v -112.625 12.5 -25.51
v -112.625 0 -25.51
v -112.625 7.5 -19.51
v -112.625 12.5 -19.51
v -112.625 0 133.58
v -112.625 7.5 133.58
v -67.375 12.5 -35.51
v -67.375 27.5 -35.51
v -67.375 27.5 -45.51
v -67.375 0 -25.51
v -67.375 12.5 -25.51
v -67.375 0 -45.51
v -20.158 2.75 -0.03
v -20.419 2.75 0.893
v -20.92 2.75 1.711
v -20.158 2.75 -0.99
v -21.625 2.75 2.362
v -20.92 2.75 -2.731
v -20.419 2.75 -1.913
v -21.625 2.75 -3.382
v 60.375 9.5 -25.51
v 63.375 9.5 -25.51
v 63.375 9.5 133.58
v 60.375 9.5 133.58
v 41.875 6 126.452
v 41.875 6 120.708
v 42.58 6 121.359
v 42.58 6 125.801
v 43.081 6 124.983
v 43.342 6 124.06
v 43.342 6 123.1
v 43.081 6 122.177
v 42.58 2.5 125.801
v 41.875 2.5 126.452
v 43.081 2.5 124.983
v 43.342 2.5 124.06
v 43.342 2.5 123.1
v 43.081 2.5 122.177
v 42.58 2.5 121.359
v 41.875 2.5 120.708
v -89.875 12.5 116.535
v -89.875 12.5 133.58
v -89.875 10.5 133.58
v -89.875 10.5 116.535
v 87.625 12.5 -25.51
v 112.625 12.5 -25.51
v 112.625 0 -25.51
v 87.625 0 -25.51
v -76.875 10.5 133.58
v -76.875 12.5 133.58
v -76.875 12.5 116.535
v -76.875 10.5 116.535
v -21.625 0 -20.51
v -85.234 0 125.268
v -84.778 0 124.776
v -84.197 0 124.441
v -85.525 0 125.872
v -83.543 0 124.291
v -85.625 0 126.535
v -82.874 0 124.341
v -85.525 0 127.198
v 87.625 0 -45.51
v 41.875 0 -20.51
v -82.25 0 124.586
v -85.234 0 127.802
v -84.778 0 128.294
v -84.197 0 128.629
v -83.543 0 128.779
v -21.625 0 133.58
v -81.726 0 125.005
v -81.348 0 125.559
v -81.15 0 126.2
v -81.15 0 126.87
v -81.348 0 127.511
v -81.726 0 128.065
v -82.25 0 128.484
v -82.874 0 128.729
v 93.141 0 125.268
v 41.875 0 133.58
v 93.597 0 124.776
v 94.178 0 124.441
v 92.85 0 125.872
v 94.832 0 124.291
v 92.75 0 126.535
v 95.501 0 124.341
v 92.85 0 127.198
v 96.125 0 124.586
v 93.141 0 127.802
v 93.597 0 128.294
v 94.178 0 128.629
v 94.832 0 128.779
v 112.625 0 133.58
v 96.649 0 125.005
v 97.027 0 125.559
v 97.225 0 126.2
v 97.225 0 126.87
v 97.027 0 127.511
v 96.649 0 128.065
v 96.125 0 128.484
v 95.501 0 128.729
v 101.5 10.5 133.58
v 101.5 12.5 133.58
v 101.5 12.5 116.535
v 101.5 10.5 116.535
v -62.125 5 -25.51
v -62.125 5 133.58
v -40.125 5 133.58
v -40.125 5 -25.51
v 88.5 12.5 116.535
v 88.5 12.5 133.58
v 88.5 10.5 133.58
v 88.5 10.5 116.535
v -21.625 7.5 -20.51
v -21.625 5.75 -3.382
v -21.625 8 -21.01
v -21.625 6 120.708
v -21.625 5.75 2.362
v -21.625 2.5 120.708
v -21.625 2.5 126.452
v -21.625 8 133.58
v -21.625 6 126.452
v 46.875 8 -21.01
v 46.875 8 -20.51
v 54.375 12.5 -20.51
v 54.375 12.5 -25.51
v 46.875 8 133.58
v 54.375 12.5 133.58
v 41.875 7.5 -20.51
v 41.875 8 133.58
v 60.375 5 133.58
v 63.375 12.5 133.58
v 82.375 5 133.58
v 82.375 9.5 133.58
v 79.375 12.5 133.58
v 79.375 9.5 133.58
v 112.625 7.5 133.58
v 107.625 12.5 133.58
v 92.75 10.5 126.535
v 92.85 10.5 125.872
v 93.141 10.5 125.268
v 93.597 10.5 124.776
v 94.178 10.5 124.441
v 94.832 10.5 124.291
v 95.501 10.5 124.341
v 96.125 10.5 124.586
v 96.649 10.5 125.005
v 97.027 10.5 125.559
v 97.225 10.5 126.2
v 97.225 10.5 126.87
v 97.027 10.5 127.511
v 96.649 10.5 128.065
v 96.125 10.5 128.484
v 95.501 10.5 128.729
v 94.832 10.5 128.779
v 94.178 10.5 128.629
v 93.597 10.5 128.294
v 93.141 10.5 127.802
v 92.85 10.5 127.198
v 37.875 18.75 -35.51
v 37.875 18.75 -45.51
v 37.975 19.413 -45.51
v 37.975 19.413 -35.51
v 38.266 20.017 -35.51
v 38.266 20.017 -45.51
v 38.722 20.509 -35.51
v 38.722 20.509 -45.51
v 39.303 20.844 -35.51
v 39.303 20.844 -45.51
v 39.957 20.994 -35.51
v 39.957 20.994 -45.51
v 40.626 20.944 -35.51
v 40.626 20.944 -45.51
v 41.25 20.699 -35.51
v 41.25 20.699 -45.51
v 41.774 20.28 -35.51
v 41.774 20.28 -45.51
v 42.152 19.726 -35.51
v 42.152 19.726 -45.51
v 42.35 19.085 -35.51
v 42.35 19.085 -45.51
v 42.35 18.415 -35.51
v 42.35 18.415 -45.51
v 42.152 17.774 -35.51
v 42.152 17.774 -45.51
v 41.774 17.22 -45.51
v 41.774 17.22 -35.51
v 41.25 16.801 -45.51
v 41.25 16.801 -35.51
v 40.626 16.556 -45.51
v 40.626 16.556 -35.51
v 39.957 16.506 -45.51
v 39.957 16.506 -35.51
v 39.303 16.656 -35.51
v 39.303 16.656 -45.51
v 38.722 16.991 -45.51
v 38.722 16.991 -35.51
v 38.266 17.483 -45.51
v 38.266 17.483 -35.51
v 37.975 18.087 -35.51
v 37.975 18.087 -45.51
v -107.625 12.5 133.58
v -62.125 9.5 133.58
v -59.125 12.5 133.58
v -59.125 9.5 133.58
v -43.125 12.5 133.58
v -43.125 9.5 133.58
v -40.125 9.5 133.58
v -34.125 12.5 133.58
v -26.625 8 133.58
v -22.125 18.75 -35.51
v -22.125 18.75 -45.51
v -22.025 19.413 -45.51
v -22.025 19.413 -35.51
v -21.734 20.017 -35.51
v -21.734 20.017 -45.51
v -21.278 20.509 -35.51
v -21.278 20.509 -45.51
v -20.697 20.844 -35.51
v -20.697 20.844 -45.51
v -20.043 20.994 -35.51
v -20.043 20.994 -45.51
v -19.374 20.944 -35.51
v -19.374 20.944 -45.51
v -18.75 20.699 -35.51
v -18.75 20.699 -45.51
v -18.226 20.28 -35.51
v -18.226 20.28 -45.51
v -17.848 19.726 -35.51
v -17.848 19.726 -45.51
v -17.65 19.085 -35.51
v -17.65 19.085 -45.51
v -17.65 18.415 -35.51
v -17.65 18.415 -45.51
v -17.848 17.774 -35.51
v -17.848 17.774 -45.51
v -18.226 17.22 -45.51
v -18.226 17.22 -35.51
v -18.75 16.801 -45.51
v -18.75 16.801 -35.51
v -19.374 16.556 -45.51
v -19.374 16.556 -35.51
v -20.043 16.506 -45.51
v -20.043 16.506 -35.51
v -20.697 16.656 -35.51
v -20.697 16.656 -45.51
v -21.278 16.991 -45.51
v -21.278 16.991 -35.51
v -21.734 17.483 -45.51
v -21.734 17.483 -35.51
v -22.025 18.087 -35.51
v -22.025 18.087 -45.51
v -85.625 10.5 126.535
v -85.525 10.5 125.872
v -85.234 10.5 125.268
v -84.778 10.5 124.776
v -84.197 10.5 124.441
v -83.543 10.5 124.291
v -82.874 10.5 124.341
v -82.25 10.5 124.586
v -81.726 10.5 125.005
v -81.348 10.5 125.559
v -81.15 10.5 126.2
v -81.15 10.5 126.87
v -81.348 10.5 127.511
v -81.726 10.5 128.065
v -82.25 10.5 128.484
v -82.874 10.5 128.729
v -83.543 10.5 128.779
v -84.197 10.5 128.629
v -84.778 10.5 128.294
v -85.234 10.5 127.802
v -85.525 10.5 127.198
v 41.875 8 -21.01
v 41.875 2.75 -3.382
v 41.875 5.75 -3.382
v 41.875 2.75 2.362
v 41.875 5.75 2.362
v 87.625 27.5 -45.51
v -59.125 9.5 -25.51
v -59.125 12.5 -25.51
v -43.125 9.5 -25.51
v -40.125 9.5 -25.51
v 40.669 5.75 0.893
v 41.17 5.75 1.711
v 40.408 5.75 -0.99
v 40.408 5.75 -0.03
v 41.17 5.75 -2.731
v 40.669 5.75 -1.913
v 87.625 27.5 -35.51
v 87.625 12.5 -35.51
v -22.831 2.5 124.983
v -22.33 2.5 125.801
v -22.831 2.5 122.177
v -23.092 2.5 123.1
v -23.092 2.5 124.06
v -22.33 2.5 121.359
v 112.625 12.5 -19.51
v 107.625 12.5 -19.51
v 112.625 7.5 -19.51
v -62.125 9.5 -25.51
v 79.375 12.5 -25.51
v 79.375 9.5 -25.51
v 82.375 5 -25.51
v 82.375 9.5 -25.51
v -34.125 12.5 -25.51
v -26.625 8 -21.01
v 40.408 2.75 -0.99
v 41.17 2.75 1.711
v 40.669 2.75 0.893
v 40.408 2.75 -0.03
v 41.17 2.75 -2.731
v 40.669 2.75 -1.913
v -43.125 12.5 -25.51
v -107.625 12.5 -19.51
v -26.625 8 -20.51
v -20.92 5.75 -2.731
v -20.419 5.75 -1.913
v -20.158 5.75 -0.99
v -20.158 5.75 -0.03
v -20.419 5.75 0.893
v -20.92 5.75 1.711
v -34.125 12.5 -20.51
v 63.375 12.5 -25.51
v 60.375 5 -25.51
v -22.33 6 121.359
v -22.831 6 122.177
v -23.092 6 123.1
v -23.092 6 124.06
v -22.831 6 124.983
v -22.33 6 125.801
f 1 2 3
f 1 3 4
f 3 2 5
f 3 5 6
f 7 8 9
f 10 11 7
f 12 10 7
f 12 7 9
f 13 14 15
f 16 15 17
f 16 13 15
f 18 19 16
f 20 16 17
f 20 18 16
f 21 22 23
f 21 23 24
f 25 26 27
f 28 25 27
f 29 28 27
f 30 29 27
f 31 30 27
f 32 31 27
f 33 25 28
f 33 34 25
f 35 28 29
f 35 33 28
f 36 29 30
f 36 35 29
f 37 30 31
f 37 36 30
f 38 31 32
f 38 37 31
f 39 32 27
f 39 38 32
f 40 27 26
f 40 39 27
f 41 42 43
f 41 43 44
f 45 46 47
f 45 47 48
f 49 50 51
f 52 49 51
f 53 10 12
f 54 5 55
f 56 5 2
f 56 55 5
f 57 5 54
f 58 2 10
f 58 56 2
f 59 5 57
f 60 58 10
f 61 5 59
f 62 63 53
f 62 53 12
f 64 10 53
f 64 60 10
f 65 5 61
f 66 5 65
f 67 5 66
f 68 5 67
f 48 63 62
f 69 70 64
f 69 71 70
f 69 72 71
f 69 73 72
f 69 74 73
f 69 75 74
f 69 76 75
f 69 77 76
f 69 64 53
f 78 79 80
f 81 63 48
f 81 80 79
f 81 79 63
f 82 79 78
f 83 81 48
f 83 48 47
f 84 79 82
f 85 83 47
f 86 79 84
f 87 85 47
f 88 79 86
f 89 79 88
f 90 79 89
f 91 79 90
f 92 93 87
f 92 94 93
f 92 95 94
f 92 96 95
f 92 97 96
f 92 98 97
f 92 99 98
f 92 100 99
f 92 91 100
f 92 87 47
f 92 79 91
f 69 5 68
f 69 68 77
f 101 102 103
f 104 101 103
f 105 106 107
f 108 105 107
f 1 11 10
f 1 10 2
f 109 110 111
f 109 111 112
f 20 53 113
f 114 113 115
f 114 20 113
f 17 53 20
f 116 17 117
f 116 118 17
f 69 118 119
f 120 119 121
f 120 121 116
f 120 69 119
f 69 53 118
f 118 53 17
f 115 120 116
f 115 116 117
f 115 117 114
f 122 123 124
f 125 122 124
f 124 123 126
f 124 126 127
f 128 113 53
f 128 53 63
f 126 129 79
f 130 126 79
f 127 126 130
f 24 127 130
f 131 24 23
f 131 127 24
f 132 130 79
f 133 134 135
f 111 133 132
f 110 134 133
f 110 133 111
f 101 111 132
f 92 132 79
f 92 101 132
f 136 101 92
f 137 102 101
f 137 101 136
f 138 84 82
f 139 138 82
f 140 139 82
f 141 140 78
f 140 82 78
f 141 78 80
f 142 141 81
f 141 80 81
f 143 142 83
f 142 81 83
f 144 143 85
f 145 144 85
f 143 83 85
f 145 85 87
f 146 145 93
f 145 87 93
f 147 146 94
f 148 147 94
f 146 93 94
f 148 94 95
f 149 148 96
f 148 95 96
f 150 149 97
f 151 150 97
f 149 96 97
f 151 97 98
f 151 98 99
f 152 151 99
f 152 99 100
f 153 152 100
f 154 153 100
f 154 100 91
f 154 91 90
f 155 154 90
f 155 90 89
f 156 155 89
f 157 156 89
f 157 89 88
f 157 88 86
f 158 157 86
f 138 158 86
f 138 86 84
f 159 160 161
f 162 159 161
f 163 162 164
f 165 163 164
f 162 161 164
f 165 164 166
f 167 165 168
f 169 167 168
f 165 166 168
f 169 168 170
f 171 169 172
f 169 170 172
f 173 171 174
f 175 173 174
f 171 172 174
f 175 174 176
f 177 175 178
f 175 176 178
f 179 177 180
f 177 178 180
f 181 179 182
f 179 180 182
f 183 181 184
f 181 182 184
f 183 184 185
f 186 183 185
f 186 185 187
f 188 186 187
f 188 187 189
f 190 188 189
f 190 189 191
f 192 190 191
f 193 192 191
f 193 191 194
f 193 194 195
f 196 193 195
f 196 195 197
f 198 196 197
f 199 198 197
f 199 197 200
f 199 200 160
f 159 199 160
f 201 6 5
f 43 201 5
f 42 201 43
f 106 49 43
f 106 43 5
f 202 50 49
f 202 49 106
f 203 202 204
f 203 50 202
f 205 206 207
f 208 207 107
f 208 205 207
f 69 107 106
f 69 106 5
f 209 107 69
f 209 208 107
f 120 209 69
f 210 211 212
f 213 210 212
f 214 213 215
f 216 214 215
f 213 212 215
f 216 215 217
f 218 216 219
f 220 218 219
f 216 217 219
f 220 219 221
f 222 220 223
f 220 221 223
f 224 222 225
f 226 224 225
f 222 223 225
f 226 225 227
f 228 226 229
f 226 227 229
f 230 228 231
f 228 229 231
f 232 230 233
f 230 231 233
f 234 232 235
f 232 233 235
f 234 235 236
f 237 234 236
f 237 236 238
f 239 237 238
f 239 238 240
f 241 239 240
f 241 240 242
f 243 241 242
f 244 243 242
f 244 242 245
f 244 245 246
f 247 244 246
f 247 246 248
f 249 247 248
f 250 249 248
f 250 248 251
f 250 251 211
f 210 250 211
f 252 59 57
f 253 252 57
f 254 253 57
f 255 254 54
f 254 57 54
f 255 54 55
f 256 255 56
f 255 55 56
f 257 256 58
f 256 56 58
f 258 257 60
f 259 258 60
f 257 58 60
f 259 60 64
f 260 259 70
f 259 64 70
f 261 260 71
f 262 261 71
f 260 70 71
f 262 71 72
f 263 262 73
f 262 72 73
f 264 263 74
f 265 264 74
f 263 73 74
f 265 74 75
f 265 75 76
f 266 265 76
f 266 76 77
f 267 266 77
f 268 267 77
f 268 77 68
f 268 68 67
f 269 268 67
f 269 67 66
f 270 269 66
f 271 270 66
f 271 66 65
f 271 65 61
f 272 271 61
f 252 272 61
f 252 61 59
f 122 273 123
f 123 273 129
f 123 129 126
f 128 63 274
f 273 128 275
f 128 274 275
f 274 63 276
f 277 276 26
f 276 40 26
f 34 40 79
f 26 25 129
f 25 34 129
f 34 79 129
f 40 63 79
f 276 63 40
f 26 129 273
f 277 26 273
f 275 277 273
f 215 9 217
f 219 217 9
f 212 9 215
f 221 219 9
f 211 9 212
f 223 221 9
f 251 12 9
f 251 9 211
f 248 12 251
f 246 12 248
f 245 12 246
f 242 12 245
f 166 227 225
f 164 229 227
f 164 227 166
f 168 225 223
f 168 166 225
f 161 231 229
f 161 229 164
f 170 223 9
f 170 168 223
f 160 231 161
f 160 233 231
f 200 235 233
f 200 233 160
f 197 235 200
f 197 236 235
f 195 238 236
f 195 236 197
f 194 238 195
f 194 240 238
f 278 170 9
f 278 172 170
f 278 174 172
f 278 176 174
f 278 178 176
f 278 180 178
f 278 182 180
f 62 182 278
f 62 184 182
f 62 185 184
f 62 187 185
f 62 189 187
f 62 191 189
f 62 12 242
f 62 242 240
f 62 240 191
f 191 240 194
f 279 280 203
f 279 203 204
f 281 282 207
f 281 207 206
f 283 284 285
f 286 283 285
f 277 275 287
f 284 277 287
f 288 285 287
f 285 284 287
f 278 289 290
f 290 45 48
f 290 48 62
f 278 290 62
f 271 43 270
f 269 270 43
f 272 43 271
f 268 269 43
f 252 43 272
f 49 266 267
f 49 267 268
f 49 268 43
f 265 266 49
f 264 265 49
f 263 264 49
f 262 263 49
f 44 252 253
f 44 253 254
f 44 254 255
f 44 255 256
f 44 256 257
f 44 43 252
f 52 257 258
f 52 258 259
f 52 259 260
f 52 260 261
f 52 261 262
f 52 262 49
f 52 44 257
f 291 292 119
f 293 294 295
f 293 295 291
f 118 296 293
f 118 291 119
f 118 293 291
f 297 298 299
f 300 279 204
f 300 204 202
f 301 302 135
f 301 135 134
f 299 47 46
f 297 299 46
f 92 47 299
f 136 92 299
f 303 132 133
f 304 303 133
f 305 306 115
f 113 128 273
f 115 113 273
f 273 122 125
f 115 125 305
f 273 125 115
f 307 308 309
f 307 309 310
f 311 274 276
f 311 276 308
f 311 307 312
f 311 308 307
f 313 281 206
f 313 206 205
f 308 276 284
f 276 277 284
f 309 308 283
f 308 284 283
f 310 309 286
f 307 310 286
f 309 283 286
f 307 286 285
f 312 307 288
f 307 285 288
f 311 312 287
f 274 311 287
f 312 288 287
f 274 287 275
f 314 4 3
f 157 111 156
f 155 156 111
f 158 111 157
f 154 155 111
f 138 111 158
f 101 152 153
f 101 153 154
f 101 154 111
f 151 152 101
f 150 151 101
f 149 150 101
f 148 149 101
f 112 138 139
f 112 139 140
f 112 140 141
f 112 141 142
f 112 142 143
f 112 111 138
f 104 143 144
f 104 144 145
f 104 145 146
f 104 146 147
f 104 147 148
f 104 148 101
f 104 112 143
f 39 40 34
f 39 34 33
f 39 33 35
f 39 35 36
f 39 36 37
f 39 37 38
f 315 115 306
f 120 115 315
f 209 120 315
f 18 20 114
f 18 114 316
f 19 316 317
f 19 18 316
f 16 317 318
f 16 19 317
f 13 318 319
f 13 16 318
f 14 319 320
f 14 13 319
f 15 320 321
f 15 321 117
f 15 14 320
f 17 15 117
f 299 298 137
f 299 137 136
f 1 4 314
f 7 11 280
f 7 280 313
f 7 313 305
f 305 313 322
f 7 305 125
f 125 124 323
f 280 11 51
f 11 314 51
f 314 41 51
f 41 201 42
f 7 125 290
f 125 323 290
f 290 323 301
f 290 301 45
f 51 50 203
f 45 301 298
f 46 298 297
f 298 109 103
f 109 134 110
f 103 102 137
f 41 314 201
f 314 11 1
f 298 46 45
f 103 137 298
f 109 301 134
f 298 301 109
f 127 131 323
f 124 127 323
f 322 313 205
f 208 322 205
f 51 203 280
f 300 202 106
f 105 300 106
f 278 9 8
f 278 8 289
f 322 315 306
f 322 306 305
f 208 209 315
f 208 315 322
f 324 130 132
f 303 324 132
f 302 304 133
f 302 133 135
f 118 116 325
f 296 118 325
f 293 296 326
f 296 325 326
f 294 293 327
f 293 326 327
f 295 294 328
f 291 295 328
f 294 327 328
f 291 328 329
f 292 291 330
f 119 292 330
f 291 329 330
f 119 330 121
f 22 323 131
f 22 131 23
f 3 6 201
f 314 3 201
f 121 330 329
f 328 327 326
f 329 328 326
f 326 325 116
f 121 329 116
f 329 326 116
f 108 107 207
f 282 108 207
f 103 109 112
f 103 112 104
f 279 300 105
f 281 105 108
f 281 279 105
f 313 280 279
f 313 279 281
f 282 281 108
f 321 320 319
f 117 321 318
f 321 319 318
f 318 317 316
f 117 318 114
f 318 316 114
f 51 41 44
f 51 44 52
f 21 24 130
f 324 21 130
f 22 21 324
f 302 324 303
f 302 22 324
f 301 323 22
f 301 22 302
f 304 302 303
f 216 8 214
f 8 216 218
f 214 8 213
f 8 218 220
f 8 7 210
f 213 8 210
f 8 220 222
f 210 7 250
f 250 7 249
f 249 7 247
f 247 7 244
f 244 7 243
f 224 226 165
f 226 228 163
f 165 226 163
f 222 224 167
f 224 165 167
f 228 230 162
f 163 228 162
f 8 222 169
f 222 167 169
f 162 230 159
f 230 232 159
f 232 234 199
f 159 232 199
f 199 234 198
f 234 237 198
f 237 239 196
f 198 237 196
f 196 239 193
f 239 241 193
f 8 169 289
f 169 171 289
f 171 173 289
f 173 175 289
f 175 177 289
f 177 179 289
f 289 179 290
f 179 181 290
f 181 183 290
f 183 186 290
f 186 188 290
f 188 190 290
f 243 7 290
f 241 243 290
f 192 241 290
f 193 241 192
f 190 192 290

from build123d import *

# Parameters (mm, degrees)
SKETCH1_W            = 225.25
SKETCH1_H            = 12.5
BOSS_EXTRUDE1_DEPTH  = 133.58
CUT_EXTRUDE1_DEPTH   = 159.09
SKETCH11_W           = 88.5
SKETCH11_H           = 154.09
CUT_EXTRUDE2_DEPTH   = 176.169223966
SKETCH12_W           = 13
SKETCH12_H           = 17.045
CUT_EXTRUDE3_DEPTH   = 2
M4_CLEARANCE_HOLE1_D = 4.5
BOSS_EXTRUDE3_DEPTH  = 154.09
CHAMFER4_START       = -19.51
CHAMFER4_DEPTH       = 154.51
CHAMFER5_START       = -19.51
CHAMFER5_DEPTH       = 154.51
CUT_EXTRUDE4_DEPTH   = 1.75
BOSS_EXTRUDE4_DEPTH  = 1.5
CUT_EXTRUDE5_DEPTH   = 176.169223966
CHAMFER6_SIZE        = 5
SKETCH19_W           = 155
SKETCH19_H           = 10
BOSS_EXTRUDE5_DEPTH  = 15
M4_CLEARANCE_HOLE2_D = 4.5


with BuildPart() as part:
    # Sketch1 → Boss-Extrude1 (new, symmetric)
    with BuildSketch(Plane.XY):
        with Locations((0, 6.25)):
            Rectangle(SKETCH1_W, SKETCH1_H)
    extrude(amount=BOSS_EXTRUDE1_DEPTH, both=True)

    # Sketch4 → Cut-Extrude1 (cut)
    with BuildSketch(Plane.XY.offset(133.58)):
        Polygon((-59.125, 12.5), (-59.125, 9.5), (-62.125, 9.5), (-62.125, 5), (-40.125, 5), (-40.125, 9.5), (-43.125, 9.5), (-43.125, 12.5), align=None)
        Polygon((63.375, 12.5), (63.375, 9.5), (60.375, 9.5), (60.375, 5), (82.375, 5), (82.375, 9.5), (79.375, 9.5), (79.375, 12.5), align=None)
    extrude(amount=-CUT_EXTRUDE1_DEPTH, mode=Mode.SUBTRACT)

    # Sketch11 → Cut-Extrude2 (cut, through all)
    with BuildSketch(Plane(origin=(0, 12.5, 0), x_dir=(1, 0, 0), z_dir=(0, 1, 0))):
        with Locations((10.125, -56.535)):
            Rectangle(SKETCH11_W, SKETCH11_H)
    extrude(amount=-CUT_EXTRUDE2_DEPTH, mode=Mode.SUBTRACT)

    # Sketch12 → Cut-Extrude3 (cut)
    with BuildSketch(Plane(origin=(0, 12.5, 0), x_dir=(1, 0, 0), z_dir=(0, 1, 0))):
        with Locations((-83.375, -125.0575)):
            Rectangle(SKETCH12_W, SKETCH12_H)
        with Locations((95, -125.0575)):
            Rectangle(SKETCH12_W, SKETCH12_H)
    extrude(amount=-CUT_EXTRUDE3_DEPTH, mode=Mode.SUBTRACT)

    # M4 Clearance Hole1 (through all)
    with Locations(Plane(origin=(0, 10.5, 0), x_dir=(1, 0, 0), z_dir=(0, 1, 0))):
        with Locations((-83.375, -126.535), (95, -126.535)):
            Hole(M4_CLEARANCE_HOLE1_D / 2)

    # Sketch15 → Boss-Extrude3 (add)
    with BuildSketch(Plane.XY.offset(133.58)):
        Polygon((-34.125, 0), (-21.625, 0), (-21.625, 8), (-26.625, 8), (-34.125, 12.5), align=None)
        Polygon((54.375, 0), (41.875, 0), (41.875, 8), (46.875, 8), (54.375, 12.5), align=None)
    extrude(amount=-BOSS_EXTRUDE3_DEPTH)

    # Chamfer4: read off the stored shape, not the designer's step
    # Chamfer4 outline → Chamfer4 (cut)
    with BuildSketch(Plane.XY.offset(CHAMFER4_START)):
        Polygon((-112.625, 12.5), (-112.625, 7.5), (-107.625, 12.5), align=None)
    extrude(amount=CHAMFER4_DEPTH, mode=Mode.SUBTRACT)

    # Chamfer5: read off the stored shape, not the designer's step
    # Chamfer5 outline → Chamfer5 (cut)
    with BuildSketch(Plane.XY.offset(CHAMFER5_START)):
        Polygon((112.625, 12.5), (107.625, 12.5), (112.625, 7.5), align=None)
    extrude(amount=CHAMFER5_DEPTH, mode=Mode.SUBTRACT)

    # Sketch16 → Cut-Extrude4 (cut, symmetric)
    with BuildSketch(Plane(origin=(0, 4.25, 0), x_dir=(-1, 0, 0), z_dir=(0, -1, 0))):
        with BuildLine():
            Line((21.625, -126.452281323), (21.625, -120.707718677))
            ThreePointArc((21.625, -120.707718677), (23.125, -123.58), (21.625, -126.452281323))
        make_face()
        with BuildLine():
            Line((-41.875, -120.707718677), (-41.875, -126.452281323))
            ThreePointArc((-41.875, -126.452281323), (-43.375, -123.58), (-41.875, -120.707718677))
        make_face()
    extrude(amount=CUT_EXTRUDE4_DEPTH, both=True, mode=Mode.SUBTRACT)

    # Sketch17 → Boss-Extrude4 (add, symmetric)
    with BuildSketch(Plane(origin=(0, 4.25, 0), x_dir=(-1, 0, 0), z_dir=(0, -1, 0))):
        with BuildLine():
            Line((-41.875, 3.382281323), (-41.875, -2.362281323))
            ThreePointArc((-41.875, -2.362281323), (-40.375, 0.51), (-41.875, 3.382281323))
        make_face()
        with BuildLine():
            Line((21.625, -2.362281323), (21.625, 3.382281323))
            ThreePointArc((21.625, 3.382281323), (20.125, 0.51), (21.625, -2.362281323))
        make_face()
    extrude(amount=BOSS_EXTRUDE4_DEPTH, both=True)

    # Sketch18 → Cut-Extrude5 (cut, through all)
    with BuildSketch(Plane(origin=(0, 12.5, 0), x_dir=(1, 0, 0), z_dir=(0, 1, 0))):
        Polygon((87.625, 45.51), (-67.375, 45.51), (-67.375, 25.51), (-112.625, 25.51), (-112.625, 133.58), (112.625, 133.58), (112.625, 25.51), (87.625, 25.51), align=None)
    extrude(amount=-CUT_EXTRUDE5_DEPTH, mode=Mode.SUBTRACT)

    # Chamfer6
    # the kernel refuses this chamfer: 5 mm, written as the material it takes off along each edge
    with BuildSketch(Plane(origin=(67.23341494, 12.5, -20.51), x_dir=(0, -1, 0), z_dir=(-1, 0, 0))) as chamfer6_piece_1_section:
        Polygon((CHAMFER6_SIZE, 0), (0, -CHAMFER6_SIZE), (0, 0), align=None)
    chamfer6_piece_1 = extrude(amount=114.21682988, mode=Mode.PRIVATE)
    chamfer6_piece_1 = split(chamfer6_piece_1, bisect_by=Plane(origin=(41.875, 12.5, -20.51), z_dir=(1, 0, 0)), keep=Keep.TOP, mode=Mode.PRIVATE)
    chamfer6_piece_1 = split(chamfer6_piece_1, bisect_by=Plane(origin=(67.23341494, 8, -20.51), z_dir=(0, 1, 0)), keep=Keep.TOP, mode=Mode.PRIVATE)
    chamfer6_piece_1 = split(chamfer6_piece_1, bisect_by=Plane(origin=(63.829716868, 18.172830121, -20.51), z_dir=(-0.514495755427524, 0.8574929257125457, 0)), keep=Keep.TOP, mode=Mode.PRIVATE)
    add(chamfer6_piece_1, mode=Mode.SUBTRACT)
    with BuildSketch(Plane(origin=(67.23341494, 12.5, -20.51), x_dir=(0, -1, 0), z_dir=(-1, 0, 0))) as chamfer6_piece_2_section:
        Polygon((CHAMFER6_SIZE, 0), (0, -CHAMFER6_SIZE), (0, 0), align=None)
    chamfer6_piece_2 = extrude(amount=114.21682988, mode=Mode.PRIVATE)
    chamfer6_piece_2 = split(chamfer6_piece_2, bisect_by=Plane(origin=(41.875, 12.5, -20.51), z_dir=(-1, 0, 0)), keep=Keep.TOP, mode=Mode.PRIVATE)
    chamfer6_piece_2 = split(chamfer6_piece_2, bisect_by=Plane(origin=(67.23341494, 8, -20.51), z_dir=(0, -1, 0)), keep=Keep.TOP, mode=Mode.PRIVATE)
    chamfer6_piece_2 = split(chamfer6_piece_2, bisect_by=Plane(origin=(-21.625, 12.5, -20.51), z_dir=(1, 0, 0)), keep=Keep.TOP, mode=Mode.PRIVATE)
    add(chamfer6_piece_2, mode=Mode.SUBTRACT)
    with BuildSketch(Plane(origin=(67.23341494, 12.5, -20.51), x_dir=(0, -1, 0), z_dir=(-1, 0, 0))) as chamfer6_piece_3_section:
        Polygon((CHAMFER6_SIZE, 0), (0, -CHAMFER6_SIZE), (0, 0), align=None)
    chamfer6_piece_3 = extrude(amount=114.21682988, mode=Mode.PRIVATE)
    chamfer6_piece_3 = split(chamfer6_piece_3, bisect_by=Plane(origin=(41.875, 12.5, -20.51), z_dir=(-1, 0, 0)), keep=Keep.TOP, mode=Mode.PRIVATE)
    chamfer6_piece_3 = split(chamfer6_piece_3, bisect_by=Plane(origin=(67.23341494, 8, -20.51), z_dir=(0, 1, 0)), keep=Keep.TOP, mode=Mode.PRIVATE)
    chamfer6_piece_3 = split(chamfer6_piece_3, bisect_by=Plane(origin=(-21.625, 12.5, -20.51), z_dir=(1, 0, 0)), keep=Keep.TOP, mode=Mode.PRIVATE)
    add(chamfer6_piece_3, mode=Mode.SUBTRACT)
    with BuildSketch(Plane(origin=(67.23341494, 12.5, -20.51), x_dir=(0, -1, 0), z_dir=(-1, 0, 0))) as chamfer6_piece_4_section:
        Polygon((CHAMFER6_SIZE, 0), (0, -CHAMFER6_SIZE), (0, 0), align=None)
    chamfer6_piece_4 = extrude(amount=114.21682988, mode=Mode.PRIVATE)
    chamfer6_piece_4 = split(chamfer6_piece_4, bisect_by=Plane(origin=(40.403246279, -32.216947768, -20.51), z_dir=(0.5144957554275245, 0.8574929257125454, 0)), keep=Keep.TOP, mode=Mode.PRIVATE)
    chamfer6_piece_4 = split(chamfer6_piece_4, bisect_by=Plane(origin=(67.23341494, 8, -20.51), z_dir=(0, 1, 0)), keep=Keep.TOP, mode=Mode.PRIVATE)
    chamfer6_piece_4 = split(chamfer6_piece_4, bisect_by=Plane(origin=(-21.625, 12.5, -20.51), z_dir=(-1, 0, 0)), keep=Keep.TOP, mode=Mode.PRIVATE)
    add(chamfer6_piece_4, mode=Mode.SUBTRACT)

    # Sketch19 → Boss-Extrude5 (add)
    with BuildSketch(Plane(origin=(0, 12.5, 0), x_dir=(1, 0, 0), z_dir=(0, 1, 0))):
        with Locations((10.125, 40.51)):
            Rectangle(SKETCH19_W, SKETCH19_H)
    extrude(amount=BOSS_EXTRUDE5_DEPTH)

    # M4 Clearance Hole2 (through all)
    with Locations(Plane.XY.offset(-35.51)):
        with Locations((-19.875, 18.75), (40.125, 18.75)):
            Hole(M4_CLEARANCE_HOLE2_D / 2)


solid = part.part
